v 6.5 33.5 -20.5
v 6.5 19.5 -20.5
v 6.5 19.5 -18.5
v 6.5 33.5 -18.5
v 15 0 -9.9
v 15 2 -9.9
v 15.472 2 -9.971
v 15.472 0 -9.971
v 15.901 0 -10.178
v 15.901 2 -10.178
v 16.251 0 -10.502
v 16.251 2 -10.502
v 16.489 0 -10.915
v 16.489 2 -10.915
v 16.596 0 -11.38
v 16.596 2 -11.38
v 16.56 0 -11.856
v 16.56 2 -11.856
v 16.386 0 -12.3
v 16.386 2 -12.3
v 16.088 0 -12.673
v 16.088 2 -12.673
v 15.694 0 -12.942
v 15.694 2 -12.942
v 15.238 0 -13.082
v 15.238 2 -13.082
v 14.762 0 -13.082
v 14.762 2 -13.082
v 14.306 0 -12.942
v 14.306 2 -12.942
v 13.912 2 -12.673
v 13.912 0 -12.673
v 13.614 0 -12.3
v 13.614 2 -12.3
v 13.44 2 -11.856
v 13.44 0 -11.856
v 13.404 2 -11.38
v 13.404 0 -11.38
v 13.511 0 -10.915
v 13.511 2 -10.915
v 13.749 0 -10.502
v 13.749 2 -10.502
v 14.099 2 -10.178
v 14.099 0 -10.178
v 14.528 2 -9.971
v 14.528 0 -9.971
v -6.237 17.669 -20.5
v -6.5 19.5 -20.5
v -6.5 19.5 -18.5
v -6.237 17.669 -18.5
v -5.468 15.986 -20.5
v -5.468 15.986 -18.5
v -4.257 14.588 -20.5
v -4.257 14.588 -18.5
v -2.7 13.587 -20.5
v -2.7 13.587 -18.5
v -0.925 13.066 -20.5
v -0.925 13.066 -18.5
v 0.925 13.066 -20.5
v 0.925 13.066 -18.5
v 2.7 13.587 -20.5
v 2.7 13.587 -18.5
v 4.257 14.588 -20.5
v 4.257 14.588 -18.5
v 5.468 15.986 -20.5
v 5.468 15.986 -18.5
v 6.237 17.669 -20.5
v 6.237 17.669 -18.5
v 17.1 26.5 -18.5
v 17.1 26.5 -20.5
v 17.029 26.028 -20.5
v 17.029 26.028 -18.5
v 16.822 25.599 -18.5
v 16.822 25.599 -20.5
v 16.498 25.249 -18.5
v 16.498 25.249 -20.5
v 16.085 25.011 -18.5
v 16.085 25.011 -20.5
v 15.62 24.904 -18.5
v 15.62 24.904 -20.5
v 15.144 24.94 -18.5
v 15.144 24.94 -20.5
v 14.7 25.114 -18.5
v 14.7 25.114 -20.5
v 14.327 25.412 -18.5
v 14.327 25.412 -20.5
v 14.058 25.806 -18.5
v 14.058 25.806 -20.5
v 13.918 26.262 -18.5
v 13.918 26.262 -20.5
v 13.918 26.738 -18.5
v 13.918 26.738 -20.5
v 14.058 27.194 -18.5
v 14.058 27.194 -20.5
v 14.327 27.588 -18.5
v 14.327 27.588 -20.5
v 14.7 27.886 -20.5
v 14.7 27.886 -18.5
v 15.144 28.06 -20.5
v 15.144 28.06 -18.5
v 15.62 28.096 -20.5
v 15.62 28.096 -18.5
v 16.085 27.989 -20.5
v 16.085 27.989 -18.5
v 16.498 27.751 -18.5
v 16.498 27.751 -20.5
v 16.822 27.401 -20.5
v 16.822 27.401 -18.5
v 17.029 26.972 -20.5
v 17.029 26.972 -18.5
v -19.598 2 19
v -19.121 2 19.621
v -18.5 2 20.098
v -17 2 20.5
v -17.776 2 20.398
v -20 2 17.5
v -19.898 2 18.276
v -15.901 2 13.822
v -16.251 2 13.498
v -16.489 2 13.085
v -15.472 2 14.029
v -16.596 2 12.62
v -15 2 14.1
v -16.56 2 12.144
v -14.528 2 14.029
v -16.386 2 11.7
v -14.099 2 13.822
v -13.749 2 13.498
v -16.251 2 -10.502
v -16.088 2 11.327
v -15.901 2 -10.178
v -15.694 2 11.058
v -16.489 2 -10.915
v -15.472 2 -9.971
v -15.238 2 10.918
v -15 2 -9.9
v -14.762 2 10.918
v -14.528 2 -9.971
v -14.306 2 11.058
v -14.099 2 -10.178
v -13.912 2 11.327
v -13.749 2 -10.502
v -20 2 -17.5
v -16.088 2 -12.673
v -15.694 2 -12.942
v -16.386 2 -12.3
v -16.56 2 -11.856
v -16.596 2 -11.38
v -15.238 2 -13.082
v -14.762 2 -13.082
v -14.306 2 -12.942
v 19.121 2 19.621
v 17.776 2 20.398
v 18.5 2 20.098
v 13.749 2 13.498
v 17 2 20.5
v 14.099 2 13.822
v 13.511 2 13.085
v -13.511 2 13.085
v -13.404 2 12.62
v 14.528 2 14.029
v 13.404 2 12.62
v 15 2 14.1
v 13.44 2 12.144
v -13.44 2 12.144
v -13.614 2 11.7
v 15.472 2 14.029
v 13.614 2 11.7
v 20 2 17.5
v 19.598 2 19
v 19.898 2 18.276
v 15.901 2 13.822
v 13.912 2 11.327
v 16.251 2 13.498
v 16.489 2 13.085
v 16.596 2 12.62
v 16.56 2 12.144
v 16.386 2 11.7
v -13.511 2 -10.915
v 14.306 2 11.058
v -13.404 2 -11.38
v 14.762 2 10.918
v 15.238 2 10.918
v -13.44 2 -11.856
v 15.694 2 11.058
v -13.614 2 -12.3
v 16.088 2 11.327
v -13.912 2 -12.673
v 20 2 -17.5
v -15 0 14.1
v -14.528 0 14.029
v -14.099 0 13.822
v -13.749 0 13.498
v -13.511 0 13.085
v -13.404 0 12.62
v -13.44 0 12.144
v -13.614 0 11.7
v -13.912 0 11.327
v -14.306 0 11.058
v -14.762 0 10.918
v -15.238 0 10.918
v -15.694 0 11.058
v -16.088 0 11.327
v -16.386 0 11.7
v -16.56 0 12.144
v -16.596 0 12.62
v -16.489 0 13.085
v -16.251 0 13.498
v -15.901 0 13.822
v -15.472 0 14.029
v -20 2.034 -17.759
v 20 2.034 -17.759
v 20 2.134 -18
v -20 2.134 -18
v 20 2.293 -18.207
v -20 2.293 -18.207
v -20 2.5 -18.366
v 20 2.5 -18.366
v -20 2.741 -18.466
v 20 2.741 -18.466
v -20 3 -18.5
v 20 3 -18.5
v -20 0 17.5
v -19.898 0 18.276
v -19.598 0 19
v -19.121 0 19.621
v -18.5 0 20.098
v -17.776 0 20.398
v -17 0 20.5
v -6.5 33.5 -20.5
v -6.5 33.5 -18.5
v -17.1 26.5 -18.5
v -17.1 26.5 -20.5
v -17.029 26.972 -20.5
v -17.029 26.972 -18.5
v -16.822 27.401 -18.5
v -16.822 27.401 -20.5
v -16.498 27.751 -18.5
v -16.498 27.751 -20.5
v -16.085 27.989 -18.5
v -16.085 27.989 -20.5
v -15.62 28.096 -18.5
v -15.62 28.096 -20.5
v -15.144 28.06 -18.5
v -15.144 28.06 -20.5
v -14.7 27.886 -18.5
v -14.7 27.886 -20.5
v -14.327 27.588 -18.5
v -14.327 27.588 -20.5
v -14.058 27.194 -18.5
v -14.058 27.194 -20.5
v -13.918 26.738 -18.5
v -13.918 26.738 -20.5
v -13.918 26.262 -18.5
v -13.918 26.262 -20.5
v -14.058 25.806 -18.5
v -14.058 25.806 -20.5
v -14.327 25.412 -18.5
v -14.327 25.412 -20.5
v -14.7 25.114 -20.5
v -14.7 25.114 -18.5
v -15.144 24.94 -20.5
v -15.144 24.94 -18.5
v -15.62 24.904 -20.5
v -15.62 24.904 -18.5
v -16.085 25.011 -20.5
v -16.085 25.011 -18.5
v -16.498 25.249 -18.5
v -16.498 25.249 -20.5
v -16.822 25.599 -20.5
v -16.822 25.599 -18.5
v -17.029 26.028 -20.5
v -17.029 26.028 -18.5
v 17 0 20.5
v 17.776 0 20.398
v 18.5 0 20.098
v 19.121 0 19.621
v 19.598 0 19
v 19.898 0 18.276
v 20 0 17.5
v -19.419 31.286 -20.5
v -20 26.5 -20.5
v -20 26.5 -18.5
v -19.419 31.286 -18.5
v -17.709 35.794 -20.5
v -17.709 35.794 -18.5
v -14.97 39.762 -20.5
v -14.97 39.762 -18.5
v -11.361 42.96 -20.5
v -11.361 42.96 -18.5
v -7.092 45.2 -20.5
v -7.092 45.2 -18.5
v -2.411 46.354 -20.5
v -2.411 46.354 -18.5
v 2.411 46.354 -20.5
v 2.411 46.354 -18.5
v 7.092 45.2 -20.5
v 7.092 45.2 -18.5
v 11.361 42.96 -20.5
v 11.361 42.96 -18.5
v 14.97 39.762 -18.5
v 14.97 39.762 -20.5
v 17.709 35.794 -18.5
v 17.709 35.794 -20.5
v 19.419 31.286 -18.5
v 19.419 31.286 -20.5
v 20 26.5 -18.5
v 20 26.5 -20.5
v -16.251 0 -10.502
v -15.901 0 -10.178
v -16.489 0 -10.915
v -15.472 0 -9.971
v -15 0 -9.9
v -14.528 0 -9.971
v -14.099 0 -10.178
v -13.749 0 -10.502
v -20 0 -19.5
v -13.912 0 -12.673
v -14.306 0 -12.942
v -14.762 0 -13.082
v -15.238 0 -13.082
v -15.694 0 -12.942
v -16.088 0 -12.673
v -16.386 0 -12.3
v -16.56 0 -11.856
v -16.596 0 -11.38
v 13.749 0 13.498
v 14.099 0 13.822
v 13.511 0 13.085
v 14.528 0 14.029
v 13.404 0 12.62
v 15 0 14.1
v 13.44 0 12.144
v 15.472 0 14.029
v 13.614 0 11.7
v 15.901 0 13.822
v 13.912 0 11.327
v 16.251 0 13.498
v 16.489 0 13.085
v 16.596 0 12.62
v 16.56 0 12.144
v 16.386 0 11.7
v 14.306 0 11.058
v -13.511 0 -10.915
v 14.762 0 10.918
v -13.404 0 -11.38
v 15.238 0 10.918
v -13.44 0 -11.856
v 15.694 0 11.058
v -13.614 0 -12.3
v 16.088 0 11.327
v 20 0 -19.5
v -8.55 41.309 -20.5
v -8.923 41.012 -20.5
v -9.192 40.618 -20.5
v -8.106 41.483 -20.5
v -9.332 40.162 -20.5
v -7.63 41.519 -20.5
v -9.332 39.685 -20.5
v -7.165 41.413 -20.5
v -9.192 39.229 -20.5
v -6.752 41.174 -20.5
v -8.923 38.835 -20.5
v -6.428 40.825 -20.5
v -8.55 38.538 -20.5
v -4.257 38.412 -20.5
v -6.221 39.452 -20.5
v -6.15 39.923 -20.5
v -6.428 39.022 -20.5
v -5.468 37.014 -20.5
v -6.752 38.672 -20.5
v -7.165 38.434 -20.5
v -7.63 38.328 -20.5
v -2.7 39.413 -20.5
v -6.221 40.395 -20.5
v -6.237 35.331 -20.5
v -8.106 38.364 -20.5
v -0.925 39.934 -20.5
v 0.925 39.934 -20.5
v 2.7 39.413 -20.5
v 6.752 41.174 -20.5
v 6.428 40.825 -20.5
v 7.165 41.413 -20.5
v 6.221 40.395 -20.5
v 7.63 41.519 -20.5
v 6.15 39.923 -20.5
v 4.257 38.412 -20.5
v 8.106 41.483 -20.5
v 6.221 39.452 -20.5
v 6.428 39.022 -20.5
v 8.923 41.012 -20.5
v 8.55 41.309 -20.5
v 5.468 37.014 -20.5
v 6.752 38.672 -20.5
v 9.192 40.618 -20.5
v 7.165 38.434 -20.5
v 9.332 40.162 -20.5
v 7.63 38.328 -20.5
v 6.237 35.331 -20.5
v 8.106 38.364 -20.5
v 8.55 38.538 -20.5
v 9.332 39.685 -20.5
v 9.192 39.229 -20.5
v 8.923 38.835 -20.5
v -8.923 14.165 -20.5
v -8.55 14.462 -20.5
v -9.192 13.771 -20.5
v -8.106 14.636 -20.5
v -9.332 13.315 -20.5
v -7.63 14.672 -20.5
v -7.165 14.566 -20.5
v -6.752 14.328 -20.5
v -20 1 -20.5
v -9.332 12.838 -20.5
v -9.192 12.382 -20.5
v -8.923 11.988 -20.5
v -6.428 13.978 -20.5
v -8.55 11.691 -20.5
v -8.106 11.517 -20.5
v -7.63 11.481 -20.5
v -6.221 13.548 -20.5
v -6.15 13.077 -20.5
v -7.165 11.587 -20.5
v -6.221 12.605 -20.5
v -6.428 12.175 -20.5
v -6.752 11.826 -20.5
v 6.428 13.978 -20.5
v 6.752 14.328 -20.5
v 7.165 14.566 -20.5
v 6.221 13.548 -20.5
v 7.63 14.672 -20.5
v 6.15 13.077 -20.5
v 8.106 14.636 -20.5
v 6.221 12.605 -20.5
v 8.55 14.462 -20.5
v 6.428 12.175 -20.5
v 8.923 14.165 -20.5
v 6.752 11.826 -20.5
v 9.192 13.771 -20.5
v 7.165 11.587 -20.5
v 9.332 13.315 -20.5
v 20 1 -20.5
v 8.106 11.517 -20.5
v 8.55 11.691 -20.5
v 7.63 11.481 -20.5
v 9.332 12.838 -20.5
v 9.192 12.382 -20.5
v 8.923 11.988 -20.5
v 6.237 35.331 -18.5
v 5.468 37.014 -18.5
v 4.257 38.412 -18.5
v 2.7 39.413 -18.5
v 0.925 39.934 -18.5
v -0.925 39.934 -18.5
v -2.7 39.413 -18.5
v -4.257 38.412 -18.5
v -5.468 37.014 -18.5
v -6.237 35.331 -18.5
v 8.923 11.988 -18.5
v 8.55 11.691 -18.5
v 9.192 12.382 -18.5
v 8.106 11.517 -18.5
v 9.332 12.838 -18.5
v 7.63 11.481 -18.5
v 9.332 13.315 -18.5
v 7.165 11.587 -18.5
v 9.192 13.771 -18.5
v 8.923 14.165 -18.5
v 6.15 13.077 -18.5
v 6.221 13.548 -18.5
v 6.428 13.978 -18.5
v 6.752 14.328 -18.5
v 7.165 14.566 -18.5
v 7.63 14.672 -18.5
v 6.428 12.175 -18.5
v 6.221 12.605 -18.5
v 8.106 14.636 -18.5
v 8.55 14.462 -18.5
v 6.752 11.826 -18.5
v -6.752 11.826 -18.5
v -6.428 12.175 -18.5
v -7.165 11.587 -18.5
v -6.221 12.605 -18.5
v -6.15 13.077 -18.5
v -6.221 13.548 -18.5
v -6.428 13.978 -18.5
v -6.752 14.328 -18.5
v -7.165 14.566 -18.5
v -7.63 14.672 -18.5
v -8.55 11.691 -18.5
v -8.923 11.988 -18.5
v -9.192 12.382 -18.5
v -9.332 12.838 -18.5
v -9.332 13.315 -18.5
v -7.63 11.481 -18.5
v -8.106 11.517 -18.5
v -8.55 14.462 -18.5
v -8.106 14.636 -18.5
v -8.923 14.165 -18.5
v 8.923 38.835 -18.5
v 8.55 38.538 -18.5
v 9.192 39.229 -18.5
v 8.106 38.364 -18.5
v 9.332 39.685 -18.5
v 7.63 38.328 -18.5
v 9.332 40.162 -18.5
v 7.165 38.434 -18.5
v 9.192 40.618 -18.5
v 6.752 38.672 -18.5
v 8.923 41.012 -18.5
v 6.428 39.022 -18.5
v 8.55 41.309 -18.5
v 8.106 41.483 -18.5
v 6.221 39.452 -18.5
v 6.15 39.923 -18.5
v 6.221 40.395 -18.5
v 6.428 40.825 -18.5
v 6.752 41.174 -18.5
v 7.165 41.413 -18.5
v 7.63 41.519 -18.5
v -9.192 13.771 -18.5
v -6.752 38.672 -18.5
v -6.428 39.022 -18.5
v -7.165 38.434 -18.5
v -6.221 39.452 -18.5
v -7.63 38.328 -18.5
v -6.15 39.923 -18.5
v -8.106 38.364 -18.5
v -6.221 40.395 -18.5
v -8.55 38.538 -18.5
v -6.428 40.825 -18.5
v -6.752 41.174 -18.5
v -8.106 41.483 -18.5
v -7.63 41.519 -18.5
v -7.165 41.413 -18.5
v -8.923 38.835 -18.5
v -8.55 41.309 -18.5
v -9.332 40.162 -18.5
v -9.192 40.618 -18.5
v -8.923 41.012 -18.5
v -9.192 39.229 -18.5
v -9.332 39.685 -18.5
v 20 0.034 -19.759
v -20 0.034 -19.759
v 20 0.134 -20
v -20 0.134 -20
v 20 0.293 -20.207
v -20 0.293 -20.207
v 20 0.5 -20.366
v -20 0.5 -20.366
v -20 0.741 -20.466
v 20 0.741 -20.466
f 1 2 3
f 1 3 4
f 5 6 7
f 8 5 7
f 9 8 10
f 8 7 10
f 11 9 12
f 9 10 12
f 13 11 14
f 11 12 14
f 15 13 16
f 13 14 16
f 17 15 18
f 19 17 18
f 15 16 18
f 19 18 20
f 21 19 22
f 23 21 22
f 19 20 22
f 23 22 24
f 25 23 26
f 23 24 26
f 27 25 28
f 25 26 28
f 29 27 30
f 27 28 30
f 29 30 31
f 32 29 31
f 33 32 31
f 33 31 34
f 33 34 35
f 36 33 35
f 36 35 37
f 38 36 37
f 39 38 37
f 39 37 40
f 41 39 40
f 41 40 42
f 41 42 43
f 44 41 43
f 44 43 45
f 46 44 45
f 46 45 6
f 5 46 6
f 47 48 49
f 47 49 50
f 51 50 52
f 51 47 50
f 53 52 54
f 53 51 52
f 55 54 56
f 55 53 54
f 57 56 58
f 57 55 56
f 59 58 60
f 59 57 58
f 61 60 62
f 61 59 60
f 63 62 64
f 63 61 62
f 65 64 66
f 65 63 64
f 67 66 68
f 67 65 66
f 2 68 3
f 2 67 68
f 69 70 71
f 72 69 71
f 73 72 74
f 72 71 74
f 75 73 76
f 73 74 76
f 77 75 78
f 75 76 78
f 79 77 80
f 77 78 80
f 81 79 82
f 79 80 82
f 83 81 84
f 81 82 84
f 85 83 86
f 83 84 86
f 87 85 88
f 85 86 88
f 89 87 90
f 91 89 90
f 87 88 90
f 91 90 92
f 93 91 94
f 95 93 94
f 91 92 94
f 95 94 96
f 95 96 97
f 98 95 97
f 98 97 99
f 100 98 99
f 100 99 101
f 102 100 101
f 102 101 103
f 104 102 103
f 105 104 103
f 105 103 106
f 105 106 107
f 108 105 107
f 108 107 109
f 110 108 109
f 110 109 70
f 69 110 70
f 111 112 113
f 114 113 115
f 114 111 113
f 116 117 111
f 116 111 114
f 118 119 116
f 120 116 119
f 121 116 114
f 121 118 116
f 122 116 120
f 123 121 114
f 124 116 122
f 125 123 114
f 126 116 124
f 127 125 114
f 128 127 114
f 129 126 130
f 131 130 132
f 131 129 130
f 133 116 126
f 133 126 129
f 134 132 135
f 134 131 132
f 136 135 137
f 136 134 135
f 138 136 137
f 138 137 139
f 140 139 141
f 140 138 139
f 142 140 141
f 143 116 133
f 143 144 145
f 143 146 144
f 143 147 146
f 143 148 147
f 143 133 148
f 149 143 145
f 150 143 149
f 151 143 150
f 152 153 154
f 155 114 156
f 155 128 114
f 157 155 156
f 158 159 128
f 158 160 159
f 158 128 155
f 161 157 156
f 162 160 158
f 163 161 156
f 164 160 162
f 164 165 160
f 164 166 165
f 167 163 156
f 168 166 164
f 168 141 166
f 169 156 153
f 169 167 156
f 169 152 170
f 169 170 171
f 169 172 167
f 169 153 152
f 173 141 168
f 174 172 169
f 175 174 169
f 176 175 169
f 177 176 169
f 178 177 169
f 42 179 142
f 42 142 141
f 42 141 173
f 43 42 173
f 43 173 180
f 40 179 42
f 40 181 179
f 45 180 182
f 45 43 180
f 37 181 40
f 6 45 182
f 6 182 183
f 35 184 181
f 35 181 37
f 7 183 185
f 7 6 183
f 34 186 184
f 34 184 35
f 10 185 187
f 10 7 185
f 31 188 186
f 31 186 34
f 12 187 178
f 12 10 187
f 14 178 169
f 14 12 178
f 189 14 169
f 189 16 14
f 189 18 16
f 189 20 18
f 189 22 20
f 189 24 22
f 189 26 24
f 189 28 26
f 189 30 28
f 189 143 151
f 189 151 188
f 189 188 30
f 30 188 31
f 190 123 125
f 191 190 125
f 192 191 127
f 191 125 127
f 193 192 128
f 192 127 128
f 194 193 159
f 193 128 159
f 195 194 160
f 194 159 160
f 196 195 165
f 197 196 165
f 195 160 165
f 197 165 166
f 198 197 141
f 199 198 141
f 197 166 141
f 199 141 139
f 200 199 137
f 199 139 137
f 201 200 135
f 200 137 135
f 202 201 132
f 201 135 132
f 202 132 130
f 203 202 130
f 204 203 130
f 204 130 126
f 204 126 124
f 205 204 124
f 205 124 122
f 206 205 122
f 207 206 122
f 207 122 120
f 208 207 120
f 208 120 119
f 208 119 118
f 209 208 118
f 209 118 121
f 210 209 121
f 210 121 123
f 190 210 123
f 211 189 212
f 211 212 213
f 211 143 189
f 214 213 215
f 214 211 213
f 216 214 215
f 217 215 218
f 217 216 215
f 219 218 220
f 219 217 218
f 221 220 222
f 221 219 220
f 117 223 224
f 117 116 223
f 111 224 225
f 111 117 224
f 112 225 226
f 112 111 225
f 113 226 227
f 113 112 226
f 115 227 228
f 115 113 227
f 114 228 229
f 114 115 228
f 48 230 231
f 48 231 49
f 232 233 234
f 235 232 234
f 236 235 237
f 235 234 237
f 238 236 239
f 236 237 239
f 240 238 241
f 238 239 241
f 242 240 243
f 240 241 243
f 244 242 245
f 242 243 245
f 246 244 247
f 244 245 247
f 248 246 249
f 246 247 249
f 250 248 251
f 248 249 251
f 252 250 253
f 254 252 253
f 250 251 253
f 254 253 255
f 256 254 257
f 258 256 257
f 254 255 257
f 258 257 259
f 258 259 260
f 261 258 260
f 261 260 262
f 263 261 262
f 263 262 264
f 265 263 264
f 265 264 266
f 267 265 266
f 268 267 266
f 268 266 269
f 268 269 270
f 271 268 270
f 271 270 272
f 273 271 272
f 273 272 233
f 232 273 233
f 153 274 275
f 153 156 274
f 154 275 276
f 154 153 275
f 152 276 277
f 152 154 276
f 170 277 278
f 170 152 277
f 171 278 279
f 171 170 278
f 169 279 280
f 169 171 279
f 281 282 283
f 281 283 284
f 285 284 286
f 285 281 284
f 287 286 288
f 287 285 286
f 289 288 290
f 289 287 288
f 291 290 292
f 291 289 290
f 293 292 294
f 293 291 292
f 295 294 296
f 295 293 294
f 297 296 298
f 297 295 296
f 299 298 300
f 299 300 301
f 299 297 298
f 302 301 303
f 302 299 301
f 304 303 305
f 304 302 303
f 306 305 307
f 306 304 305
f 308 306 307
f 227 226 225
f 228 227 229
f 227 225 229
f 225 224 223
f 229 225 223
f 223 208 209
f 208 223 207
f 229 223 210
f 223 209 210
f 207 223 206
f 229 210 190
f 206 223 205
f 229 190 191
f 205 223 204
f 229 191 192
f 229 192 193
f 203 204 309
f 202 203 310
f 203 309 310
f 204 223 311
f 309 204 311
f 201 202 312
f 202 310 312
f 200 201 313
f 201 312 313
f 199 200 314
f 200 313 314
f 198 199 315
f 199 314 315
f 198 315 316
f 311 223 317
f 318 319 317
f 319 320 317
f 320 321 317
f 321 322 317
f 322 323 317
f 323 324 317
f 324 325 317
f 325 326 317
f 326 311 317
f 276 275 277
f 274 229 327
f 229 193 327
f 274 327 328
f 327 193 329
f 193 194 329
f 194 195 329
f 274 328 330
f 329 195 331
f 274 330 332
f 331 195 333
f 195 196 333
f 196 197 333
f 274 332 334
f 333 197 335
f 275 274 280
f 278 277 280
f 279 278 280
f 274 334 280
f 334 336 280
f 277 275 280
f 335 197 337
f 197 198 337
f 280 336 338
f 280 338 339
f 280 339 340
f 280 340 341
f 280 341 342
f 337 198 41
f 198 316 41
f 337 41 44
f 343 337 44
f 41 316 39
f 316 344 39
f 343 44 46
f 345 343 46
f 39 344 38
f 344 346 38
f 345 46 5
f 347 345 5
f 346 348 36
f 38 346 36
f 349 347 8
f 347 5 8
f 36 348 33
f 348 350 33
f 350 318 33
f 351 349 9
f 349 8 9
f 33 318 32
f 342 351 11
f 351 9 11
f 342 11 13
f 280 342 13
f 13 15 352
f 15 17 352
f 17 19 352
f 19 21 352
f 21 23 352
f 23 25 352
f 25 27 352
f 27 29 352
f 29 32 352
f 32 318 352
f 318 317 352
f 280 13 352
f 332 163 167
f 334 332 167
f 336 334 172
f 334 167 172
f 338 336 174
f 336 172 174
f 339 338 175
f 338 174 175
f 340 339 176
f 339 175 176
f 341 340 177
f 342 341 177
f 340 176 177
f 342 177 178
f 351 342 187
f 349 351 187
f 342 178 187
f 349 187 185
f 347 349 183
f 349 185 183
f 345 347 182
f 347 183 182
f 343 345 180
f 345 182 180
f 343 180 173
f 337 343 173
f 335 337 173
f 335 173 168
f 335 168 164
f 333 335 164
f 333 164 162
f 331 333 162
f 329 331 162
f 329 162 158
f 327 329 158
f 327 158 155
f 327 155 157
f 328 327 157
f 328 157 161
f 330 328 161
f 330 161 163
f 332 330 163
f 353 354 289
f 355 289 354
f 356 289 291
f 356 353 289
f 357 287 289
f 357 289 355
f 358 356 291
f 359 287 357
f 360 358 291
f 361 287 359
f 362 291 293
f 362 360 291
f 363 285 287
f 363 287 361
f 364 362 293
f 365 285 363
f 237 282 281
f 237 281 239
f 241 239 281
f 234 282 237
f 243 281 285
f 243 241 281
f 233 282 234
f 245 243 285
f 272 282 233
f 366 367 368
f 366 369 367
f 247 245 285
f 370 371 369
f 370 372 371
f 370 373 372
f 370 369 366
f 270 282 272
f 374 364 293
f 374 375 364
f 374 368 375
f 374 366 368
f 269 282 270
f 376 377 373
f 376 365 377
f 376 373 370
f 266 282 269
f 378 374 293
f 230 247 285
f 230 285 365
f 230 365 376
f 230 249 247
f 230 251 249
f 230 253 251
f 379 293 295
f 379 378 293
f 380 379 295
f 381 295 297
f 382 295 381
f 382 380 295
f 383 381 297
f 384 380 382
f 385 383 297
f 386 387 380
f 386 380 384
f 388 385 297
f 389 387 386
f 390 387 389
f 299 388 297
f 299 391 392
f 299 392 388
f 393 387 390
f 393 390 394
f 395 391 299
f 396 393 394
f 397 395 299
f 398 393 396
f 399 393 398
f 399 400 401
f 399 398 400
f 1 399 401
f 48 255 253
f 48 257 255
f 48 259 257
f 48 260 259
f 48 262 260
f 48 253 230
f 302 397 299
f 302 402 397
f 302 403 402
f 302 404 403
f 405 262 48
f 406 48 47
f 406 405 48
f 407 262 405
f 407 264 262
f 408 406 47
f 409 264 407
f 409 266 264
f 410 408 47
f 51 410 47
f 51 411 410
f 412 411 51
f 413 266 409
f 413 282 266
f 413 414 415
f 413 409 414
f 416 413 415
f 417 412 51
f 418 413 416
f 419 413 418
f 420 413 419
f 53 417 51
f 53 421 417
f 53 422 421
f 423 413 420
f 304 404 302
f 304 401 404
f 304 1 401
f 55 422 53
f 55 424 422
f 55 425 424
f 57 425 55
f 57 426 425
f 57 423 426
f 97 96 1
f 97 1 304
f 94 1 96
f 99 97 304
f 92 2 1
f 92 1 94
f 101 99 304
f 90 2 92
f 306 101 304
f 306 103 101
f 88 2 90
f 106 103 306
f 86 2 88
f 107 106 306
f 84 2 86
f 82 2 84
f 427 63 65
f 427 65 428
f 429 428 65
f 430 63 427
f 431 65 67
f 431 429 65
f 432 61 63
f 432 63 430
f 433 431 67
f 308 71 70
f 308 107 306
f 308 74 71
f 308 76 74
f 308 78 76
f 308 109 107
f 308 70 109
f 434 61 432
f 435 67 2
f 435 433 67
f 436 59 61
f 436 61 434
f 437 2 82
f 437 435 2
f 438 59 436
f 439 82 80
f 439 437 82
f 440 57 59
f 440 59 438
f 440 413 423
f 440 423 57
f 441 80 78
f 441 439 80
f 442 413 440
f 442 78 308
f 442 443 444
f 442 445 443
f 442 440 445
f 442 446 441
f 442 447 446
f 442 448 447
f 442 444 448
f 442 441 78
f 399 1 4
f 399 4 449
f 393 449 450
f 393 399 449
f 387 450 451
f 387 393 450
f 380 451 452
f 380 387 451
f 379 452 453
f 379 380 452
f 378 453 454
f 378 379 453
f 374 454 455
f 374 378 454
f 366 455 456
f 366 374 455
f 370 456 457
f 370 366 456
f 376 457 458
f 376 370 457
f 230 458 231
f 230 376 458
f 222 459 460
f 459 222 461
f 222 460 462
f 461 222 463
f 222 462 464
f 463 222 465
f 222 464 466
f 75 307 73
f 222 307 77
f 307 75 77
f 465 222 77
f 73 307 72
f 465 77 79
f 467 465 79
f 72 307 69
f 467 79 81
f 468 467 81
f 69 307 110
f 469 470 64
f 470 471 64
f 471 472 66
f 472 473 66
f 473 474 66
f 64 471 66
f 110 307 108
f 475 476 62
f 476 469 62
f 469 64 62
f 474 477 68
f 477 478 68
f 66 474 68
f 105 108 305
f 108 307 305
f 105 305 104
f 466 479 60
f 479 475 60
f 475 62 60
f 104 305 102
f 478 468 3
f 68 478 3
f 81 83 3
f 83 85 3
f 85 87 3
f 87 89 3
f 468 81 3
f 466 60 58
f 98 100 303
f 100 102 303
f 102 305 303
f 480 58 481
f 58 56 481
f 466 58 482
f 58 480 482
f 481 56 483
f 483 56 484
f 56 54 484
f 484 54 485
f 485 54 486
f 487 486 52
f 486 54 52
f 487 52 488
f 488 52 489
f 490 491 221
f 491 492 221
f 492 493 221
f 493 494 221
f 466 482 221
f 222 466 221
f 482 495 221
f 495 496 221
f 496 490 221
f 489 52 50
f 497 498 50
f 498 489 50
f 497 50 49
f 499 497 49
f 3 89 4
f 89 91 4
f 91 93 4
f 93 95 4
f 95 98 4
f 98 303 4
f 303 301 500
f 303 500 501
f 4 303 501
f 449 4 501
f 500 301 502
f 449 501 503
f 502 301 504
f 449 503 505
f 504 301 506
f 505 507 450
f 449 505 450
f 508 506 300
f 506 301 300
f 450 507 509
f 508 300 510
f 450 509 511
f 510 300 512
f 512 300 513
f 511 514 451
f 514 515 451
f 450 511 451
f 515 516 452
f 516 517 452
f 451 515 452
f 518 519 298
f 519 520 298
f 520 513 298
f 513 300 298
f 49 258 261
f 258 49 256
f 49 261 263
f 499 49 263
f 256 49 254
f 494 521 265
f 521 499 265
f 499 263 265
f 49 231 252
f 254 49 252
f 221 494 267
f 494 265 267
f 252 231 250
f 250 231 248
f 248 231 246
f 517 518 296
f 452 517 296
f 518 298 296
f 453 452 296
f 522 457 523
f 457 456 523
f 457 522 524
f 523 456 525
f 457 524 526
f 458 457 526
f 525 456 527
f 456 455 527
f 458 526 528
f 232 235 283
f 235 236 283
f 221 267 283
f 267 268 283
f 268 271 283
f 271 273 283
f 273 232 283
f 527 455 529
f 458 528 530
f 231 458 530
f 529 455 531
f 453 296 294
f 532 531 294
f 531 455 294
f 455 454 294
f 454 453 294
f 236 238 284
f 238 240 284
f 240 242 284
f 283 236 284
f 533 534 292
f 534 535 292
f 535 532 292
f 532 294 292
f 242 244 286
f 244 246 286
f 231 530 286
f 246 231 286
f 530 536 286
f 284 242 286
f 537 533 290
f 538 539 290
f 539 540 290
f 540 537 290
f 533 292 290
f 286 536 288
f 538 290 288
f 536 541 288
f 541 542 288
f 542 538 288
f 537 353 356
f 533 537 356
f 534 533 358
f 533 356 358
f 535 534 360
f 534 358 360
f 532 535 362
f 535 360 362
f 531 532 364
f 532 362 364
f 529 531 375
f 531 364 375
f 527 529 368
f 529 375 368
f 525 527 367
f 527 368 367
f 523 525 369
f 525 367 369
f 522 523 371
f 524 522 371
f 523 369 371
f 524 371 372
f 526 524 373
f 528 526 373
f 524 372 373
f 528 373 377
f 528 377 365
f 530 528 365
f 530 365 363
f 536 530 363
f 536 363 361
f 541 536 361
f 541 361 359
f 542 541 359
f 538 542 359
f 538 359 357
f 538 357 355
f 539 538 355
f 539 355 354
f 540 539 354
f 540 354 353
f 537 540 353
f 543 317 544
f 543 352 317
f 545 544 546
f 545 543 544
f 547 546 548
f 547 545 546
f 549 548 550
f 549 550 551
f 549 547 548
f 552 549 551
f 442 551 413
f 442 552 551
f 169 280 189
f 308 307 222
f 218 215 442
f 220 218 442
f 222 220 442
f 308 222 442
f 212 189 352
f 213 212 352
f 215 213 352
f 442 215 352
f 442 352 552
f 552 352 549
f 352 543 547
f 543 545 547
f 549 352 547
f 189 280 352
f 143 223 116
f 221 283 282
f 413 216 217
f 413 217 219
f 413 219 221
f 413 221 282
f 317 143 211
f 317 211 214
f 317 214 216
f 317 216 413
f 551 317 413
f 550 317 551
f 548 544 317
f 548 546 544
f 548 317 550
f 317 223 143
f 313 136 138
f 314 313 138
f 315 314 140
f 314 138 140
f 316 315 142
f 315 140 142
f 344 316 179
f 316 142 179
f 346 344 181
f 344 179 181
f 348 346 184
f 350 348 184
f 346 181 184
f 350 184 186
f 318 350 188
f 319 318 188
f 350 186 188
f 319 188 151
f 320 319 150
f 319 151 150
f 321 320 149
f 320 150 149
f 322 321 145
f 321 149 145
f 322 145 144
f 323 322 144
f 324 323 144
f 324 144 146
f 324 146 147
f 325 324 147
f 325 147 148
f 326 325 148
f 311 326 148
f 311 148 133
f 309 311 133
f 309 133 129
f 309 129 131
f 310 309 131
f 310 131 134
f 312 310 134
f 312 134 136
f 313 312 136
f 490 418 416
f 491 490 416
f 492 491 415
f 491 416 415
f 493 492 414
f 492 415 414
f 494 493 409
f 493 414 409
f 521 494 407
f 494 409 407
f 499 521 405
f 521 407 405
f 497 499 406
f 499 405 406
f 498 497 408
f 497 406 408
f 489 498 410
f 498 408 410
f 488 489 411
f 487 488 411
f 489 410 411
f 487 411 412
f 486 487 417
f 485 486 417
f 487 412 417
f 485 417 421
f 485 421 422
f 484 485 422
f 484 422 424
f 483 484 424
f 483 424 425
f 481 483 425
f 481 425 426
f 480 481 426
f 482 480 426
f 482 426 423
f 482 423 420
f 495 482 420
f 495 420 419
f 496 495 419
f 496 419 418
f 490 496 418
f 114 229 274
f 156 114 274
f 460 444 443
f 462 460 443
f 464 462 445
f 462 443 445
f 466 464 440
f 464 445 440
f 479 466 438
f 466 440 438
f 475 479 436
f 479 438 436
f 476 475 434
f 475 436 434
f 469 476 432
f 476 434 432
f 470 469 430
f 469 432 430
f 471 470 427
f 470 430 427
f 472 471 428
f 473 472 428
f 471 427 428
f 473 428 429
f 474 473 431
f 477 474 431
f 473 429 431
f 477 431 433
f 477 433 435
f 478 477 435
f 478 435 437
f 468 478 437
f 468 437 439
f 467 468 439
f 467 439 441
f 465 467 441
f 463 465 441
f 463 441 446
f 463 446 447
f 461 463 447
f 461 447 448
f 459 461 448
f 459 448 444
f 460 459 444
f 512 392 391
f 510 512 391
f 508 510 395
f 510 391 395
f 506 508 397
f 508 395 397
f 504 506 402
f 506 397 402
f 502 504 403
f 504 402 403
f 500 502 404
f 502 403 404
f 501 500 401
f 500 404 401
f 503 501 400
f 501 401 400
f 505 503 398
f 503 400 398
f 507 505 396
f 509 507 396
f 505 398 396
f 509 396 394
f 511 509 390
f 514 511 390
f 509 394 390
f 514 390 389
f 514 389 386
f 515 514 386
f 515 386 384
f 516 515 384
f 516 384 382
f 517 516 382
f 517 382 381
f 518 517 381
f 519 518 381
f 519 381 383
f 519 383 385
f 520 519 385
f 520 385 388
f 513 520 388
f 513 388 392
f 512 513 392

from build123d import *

# Parameters (mm, degrees)
SKETCH_1_W               = 40
SKETCH_1_H               = 41
EXTRUDE_1_DEPTH          = 2
FILLET_1_R               = 3
SKETCH_2_R               = 1.6
CUT_EXTRUDE_1_DEPTH      = 50
EXTRUDE_2_DEPTH          = 2
CUT_EXTRUDE_2_DEPTH      = 50
SKETCH_5_R               = 1.6
CUT_EXTRUDE_3_DEPTH      = 50
PATTERN_CIRCULAR_1_COUNT = 6
FILLET_2_R               = 1
FILLET_3_R               = 1


with BuildPart() as part:
    # 草图1 → 凸台-拉伸1 (new body)
    with BuildSketch(Plane(origin=(0, 0, 0), x_dir=(1, 0, 0), z_dir=(0, 1, 0))):
        Rectangle(SKETCH_1_W, SKETCH_1_H)
    extrude(amount=EXTRUDE_1_DEPTH)

    # 圆角1
    fillet_1_edges = [part.edges().sort_by_distance(p)[0] for p in [
        (20, 1, 20.5),
        (-20, 1, 20.5),
    ]]
    fillet(fillet_1_edges, radius=FILLET_1_R)

    # 草图2 → 切除-拉伸1 (cut)
    with BuildSketch(Plane(origin=(0, 2, 0), x_dir=(1, 0, 0), z_dir=(0, 1, 0))):
        with Locations(Location((-15, -12.5, 0), (0, 0, 270))):
            Circle(SKETCH_2_R)
        with Locations(Location((-15, 11.5, 0), (0, 0, 270))):
            Circle(SKETCH_2_R)
        with Locations(Location((15, 11.5, 0), (0, 0, 270))):
            Circle(SKETCH_2_R)
        with Locations(Location((15, -12.5, 0), (0, 0, 270))):
            Circle(SKETCH_2_R)
    extrude(amount=-CUT_EXTRUDE_1_DEPTH, mode=Mode.SUBTRACT)

    # 草图3 → 凸台-拉伸2 (add)
    with BuildSketch(Plane(origin=(0, 0, -20.5), x_dir=(-1, 0, 0), z_dir=(0, 0, -1))):
        with BuildLine():
            Line((-20, 0), (20, 0))
            Line((20, 0), (20, 26.5))
            ThreePointArc((20, 26.5), (0, 46.5), (-20, 26.5))
            Line((-20, 26.5), (-20, 0))
        make_face()
    extrude(amount=-EXTRUDE_2_DEPTH)

    # 草图4 → 切除-拉伸2 (cut)
    with BuildSketch(Plane(origin=(0, 0, -20.5), x_dir=(-1, 0, 0), z_dir=(0, 0, -1))):
        with BuildLine():
            Line((6.5, 33.5), (6.5, 19.5))
            ThreePointArc((6.5, 19.5), (0, 13), (-6.5, 19.5))
            Line((-6.5, 19.5), (-6.5, 33.5))
            ThreePointArc((-6.5, 33.5), (0, 40), (6.5, 33.5))
        make_face()
    extrude(amount=-CUT_EXTRUDE_2_DEPTH, mode=Mode.SUBTRACT)

    # 草图5 → 切除-拉伸3 (cut)
    with BuildSketch(Plane(origin=(0, 0, -20.5), x_dir=(-1, 0, 0), z_dir=(0, 0, -1))):
        with Locations((15.5, 26.5)):
            Circle(SKETCH_5_R)
    cut_extrude_3 = extrude(amount=-CUT_EXTRUDE_3_DEPTH, mode=Mode.SUBTRACT)

    # 阵列(圆周)1: 切除-拉伸3 ×6 about axis
    pattern_circular_1_axis = Axis((0, 26.5, 0), (0, 0, 1))
    for i in range(1, PATTERN_CIRCULAR_1_COUNT):
        add(cut_extrude_3.rotate(pattern_circular_1_axis, i * 360 / PATTERN_CIRCULAR_1_COUNT), mode=Mode.SUBTRACT)

    # 圆角2
    fillet_2_edges = [part.edges().sort_by_distance(p)[0] for p in [
        (0, 0, -20.5),
    ]]
    fillet(fillet_2_edges, radius=FILLET_2_R)

    # 圆角3
    fillet_3_edges = [part.edges().sort_by_distance(p)[0] for p in [
        (0, 2, -18.5),
    ]]
    fillet(fillet_3_edges, radius=FILLET_3_R)


solid = part.part
